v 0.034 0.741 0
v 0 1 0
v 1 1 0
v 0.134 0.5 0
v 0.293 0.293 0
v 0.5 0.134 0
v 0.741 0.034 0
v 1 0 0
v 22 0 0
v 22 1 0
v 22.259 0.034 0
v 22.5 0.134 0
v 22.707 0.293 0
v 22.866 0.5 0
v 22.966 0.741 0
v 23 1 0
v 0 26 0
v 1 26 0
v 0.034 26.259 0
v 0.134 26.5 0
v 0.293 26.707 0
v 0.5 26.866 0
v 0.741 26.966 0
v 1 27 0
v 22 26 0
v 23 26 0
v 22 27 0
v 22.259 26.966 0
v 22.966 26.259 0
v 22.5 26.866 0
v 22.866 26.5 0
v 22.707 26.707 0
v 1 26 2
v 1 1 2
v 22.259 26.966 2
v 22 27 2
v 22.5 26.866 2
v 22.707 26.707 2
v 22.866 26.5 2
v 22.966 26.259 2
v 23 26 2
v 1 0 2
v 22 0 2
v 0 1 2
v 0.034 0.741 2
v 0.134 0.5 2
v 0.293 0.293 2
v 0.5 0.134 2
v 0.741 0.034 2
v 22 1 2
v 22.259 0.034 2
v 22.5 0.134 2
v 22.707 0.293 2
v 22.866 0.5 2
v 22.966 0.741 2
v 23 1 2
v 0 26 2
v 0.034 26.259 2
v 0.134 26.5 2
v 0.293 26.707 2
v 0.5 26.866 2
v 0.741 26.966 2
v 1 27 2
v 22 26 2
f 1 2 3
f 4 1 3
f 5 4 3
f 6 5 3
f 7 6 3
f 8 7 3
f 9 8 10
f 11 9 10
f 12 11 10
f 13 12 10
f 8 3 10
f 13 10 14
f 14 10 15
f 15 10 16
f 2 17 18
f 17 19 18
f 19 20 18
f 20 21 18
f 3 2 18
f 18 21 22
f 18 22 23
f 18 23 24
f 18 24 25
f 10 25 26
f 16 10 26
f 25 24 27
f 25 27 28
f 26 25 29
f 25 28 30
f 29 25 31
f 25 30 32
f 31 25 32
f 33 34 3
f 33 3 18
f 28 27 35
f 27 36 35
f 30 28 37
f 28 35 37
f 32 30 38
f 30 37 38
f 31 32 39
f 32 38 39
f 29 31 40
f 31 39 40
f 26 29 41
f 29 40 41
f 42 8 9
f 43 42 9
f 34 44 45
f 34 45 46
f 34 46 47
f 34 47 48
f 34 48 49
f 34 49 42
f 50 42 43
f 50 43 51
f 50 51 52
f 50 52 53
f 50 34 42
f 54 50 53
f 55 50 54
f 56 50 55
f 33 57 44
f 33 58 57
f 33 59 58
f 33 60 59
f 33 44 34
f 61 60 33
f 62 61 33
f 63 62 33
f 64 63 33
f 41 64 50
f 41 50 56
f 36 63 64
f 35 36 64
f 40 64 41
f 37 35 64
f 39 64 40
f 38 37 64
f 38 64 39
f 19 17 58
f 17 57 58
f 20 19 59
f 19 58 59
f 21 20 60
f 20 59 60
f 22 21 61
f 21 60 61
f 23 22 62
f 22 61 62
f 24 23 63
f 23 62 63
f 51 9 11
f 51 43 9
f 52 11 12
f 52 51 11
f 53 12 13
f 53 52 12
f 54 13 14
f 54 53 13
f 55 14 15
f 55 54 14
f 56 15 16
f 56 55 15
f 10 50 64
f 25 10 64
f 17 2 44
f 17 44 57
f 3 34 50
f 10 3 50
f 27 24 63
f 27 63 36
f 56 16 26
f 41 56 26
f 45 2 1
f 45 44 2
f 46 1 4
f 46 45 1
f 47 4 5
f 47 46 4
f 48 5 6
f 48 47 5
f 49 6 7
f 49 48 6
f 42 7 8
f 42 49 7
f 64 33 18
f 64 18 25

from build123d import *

# Parameters (mm, degrees)
F0_W     = 23
F0_H     = 27
F1_DEPTH = 2
F2_W     = 21
F2_H     = 25
F3_DEPTH = 2.001
F4_R     = 1


with BuildPart() as f1:
    # F0 (on Top) → F1 (new body)
    with BuildSketch(Plane.XY):
        with Locations((11.5, 13.5)):
            Rectangle(F0_W, F0_H)
    extrude(amount=F1_DEPTH)

    # F2 (on face) → F3 (cut, through all)
    with BuildSketch(Plane.XY.offset(2)):
        with Locations((11.5, 13.5)):
            Rectangle(F2_W, F2_H)
    extrude(amount=-F3_DEPTH, mode=Mode.SUBTRACT)

    # F4
    f4_edges = [f1.edges().sort_by_distance(p)[0] for p in [
        (23, 0, 1),
        (23, 27, 1),
        (0, 0, 1),
        (0, 27, 1),
    ]]
    fillet(f4_edges, radius=F4_R)


solid = f1.part
